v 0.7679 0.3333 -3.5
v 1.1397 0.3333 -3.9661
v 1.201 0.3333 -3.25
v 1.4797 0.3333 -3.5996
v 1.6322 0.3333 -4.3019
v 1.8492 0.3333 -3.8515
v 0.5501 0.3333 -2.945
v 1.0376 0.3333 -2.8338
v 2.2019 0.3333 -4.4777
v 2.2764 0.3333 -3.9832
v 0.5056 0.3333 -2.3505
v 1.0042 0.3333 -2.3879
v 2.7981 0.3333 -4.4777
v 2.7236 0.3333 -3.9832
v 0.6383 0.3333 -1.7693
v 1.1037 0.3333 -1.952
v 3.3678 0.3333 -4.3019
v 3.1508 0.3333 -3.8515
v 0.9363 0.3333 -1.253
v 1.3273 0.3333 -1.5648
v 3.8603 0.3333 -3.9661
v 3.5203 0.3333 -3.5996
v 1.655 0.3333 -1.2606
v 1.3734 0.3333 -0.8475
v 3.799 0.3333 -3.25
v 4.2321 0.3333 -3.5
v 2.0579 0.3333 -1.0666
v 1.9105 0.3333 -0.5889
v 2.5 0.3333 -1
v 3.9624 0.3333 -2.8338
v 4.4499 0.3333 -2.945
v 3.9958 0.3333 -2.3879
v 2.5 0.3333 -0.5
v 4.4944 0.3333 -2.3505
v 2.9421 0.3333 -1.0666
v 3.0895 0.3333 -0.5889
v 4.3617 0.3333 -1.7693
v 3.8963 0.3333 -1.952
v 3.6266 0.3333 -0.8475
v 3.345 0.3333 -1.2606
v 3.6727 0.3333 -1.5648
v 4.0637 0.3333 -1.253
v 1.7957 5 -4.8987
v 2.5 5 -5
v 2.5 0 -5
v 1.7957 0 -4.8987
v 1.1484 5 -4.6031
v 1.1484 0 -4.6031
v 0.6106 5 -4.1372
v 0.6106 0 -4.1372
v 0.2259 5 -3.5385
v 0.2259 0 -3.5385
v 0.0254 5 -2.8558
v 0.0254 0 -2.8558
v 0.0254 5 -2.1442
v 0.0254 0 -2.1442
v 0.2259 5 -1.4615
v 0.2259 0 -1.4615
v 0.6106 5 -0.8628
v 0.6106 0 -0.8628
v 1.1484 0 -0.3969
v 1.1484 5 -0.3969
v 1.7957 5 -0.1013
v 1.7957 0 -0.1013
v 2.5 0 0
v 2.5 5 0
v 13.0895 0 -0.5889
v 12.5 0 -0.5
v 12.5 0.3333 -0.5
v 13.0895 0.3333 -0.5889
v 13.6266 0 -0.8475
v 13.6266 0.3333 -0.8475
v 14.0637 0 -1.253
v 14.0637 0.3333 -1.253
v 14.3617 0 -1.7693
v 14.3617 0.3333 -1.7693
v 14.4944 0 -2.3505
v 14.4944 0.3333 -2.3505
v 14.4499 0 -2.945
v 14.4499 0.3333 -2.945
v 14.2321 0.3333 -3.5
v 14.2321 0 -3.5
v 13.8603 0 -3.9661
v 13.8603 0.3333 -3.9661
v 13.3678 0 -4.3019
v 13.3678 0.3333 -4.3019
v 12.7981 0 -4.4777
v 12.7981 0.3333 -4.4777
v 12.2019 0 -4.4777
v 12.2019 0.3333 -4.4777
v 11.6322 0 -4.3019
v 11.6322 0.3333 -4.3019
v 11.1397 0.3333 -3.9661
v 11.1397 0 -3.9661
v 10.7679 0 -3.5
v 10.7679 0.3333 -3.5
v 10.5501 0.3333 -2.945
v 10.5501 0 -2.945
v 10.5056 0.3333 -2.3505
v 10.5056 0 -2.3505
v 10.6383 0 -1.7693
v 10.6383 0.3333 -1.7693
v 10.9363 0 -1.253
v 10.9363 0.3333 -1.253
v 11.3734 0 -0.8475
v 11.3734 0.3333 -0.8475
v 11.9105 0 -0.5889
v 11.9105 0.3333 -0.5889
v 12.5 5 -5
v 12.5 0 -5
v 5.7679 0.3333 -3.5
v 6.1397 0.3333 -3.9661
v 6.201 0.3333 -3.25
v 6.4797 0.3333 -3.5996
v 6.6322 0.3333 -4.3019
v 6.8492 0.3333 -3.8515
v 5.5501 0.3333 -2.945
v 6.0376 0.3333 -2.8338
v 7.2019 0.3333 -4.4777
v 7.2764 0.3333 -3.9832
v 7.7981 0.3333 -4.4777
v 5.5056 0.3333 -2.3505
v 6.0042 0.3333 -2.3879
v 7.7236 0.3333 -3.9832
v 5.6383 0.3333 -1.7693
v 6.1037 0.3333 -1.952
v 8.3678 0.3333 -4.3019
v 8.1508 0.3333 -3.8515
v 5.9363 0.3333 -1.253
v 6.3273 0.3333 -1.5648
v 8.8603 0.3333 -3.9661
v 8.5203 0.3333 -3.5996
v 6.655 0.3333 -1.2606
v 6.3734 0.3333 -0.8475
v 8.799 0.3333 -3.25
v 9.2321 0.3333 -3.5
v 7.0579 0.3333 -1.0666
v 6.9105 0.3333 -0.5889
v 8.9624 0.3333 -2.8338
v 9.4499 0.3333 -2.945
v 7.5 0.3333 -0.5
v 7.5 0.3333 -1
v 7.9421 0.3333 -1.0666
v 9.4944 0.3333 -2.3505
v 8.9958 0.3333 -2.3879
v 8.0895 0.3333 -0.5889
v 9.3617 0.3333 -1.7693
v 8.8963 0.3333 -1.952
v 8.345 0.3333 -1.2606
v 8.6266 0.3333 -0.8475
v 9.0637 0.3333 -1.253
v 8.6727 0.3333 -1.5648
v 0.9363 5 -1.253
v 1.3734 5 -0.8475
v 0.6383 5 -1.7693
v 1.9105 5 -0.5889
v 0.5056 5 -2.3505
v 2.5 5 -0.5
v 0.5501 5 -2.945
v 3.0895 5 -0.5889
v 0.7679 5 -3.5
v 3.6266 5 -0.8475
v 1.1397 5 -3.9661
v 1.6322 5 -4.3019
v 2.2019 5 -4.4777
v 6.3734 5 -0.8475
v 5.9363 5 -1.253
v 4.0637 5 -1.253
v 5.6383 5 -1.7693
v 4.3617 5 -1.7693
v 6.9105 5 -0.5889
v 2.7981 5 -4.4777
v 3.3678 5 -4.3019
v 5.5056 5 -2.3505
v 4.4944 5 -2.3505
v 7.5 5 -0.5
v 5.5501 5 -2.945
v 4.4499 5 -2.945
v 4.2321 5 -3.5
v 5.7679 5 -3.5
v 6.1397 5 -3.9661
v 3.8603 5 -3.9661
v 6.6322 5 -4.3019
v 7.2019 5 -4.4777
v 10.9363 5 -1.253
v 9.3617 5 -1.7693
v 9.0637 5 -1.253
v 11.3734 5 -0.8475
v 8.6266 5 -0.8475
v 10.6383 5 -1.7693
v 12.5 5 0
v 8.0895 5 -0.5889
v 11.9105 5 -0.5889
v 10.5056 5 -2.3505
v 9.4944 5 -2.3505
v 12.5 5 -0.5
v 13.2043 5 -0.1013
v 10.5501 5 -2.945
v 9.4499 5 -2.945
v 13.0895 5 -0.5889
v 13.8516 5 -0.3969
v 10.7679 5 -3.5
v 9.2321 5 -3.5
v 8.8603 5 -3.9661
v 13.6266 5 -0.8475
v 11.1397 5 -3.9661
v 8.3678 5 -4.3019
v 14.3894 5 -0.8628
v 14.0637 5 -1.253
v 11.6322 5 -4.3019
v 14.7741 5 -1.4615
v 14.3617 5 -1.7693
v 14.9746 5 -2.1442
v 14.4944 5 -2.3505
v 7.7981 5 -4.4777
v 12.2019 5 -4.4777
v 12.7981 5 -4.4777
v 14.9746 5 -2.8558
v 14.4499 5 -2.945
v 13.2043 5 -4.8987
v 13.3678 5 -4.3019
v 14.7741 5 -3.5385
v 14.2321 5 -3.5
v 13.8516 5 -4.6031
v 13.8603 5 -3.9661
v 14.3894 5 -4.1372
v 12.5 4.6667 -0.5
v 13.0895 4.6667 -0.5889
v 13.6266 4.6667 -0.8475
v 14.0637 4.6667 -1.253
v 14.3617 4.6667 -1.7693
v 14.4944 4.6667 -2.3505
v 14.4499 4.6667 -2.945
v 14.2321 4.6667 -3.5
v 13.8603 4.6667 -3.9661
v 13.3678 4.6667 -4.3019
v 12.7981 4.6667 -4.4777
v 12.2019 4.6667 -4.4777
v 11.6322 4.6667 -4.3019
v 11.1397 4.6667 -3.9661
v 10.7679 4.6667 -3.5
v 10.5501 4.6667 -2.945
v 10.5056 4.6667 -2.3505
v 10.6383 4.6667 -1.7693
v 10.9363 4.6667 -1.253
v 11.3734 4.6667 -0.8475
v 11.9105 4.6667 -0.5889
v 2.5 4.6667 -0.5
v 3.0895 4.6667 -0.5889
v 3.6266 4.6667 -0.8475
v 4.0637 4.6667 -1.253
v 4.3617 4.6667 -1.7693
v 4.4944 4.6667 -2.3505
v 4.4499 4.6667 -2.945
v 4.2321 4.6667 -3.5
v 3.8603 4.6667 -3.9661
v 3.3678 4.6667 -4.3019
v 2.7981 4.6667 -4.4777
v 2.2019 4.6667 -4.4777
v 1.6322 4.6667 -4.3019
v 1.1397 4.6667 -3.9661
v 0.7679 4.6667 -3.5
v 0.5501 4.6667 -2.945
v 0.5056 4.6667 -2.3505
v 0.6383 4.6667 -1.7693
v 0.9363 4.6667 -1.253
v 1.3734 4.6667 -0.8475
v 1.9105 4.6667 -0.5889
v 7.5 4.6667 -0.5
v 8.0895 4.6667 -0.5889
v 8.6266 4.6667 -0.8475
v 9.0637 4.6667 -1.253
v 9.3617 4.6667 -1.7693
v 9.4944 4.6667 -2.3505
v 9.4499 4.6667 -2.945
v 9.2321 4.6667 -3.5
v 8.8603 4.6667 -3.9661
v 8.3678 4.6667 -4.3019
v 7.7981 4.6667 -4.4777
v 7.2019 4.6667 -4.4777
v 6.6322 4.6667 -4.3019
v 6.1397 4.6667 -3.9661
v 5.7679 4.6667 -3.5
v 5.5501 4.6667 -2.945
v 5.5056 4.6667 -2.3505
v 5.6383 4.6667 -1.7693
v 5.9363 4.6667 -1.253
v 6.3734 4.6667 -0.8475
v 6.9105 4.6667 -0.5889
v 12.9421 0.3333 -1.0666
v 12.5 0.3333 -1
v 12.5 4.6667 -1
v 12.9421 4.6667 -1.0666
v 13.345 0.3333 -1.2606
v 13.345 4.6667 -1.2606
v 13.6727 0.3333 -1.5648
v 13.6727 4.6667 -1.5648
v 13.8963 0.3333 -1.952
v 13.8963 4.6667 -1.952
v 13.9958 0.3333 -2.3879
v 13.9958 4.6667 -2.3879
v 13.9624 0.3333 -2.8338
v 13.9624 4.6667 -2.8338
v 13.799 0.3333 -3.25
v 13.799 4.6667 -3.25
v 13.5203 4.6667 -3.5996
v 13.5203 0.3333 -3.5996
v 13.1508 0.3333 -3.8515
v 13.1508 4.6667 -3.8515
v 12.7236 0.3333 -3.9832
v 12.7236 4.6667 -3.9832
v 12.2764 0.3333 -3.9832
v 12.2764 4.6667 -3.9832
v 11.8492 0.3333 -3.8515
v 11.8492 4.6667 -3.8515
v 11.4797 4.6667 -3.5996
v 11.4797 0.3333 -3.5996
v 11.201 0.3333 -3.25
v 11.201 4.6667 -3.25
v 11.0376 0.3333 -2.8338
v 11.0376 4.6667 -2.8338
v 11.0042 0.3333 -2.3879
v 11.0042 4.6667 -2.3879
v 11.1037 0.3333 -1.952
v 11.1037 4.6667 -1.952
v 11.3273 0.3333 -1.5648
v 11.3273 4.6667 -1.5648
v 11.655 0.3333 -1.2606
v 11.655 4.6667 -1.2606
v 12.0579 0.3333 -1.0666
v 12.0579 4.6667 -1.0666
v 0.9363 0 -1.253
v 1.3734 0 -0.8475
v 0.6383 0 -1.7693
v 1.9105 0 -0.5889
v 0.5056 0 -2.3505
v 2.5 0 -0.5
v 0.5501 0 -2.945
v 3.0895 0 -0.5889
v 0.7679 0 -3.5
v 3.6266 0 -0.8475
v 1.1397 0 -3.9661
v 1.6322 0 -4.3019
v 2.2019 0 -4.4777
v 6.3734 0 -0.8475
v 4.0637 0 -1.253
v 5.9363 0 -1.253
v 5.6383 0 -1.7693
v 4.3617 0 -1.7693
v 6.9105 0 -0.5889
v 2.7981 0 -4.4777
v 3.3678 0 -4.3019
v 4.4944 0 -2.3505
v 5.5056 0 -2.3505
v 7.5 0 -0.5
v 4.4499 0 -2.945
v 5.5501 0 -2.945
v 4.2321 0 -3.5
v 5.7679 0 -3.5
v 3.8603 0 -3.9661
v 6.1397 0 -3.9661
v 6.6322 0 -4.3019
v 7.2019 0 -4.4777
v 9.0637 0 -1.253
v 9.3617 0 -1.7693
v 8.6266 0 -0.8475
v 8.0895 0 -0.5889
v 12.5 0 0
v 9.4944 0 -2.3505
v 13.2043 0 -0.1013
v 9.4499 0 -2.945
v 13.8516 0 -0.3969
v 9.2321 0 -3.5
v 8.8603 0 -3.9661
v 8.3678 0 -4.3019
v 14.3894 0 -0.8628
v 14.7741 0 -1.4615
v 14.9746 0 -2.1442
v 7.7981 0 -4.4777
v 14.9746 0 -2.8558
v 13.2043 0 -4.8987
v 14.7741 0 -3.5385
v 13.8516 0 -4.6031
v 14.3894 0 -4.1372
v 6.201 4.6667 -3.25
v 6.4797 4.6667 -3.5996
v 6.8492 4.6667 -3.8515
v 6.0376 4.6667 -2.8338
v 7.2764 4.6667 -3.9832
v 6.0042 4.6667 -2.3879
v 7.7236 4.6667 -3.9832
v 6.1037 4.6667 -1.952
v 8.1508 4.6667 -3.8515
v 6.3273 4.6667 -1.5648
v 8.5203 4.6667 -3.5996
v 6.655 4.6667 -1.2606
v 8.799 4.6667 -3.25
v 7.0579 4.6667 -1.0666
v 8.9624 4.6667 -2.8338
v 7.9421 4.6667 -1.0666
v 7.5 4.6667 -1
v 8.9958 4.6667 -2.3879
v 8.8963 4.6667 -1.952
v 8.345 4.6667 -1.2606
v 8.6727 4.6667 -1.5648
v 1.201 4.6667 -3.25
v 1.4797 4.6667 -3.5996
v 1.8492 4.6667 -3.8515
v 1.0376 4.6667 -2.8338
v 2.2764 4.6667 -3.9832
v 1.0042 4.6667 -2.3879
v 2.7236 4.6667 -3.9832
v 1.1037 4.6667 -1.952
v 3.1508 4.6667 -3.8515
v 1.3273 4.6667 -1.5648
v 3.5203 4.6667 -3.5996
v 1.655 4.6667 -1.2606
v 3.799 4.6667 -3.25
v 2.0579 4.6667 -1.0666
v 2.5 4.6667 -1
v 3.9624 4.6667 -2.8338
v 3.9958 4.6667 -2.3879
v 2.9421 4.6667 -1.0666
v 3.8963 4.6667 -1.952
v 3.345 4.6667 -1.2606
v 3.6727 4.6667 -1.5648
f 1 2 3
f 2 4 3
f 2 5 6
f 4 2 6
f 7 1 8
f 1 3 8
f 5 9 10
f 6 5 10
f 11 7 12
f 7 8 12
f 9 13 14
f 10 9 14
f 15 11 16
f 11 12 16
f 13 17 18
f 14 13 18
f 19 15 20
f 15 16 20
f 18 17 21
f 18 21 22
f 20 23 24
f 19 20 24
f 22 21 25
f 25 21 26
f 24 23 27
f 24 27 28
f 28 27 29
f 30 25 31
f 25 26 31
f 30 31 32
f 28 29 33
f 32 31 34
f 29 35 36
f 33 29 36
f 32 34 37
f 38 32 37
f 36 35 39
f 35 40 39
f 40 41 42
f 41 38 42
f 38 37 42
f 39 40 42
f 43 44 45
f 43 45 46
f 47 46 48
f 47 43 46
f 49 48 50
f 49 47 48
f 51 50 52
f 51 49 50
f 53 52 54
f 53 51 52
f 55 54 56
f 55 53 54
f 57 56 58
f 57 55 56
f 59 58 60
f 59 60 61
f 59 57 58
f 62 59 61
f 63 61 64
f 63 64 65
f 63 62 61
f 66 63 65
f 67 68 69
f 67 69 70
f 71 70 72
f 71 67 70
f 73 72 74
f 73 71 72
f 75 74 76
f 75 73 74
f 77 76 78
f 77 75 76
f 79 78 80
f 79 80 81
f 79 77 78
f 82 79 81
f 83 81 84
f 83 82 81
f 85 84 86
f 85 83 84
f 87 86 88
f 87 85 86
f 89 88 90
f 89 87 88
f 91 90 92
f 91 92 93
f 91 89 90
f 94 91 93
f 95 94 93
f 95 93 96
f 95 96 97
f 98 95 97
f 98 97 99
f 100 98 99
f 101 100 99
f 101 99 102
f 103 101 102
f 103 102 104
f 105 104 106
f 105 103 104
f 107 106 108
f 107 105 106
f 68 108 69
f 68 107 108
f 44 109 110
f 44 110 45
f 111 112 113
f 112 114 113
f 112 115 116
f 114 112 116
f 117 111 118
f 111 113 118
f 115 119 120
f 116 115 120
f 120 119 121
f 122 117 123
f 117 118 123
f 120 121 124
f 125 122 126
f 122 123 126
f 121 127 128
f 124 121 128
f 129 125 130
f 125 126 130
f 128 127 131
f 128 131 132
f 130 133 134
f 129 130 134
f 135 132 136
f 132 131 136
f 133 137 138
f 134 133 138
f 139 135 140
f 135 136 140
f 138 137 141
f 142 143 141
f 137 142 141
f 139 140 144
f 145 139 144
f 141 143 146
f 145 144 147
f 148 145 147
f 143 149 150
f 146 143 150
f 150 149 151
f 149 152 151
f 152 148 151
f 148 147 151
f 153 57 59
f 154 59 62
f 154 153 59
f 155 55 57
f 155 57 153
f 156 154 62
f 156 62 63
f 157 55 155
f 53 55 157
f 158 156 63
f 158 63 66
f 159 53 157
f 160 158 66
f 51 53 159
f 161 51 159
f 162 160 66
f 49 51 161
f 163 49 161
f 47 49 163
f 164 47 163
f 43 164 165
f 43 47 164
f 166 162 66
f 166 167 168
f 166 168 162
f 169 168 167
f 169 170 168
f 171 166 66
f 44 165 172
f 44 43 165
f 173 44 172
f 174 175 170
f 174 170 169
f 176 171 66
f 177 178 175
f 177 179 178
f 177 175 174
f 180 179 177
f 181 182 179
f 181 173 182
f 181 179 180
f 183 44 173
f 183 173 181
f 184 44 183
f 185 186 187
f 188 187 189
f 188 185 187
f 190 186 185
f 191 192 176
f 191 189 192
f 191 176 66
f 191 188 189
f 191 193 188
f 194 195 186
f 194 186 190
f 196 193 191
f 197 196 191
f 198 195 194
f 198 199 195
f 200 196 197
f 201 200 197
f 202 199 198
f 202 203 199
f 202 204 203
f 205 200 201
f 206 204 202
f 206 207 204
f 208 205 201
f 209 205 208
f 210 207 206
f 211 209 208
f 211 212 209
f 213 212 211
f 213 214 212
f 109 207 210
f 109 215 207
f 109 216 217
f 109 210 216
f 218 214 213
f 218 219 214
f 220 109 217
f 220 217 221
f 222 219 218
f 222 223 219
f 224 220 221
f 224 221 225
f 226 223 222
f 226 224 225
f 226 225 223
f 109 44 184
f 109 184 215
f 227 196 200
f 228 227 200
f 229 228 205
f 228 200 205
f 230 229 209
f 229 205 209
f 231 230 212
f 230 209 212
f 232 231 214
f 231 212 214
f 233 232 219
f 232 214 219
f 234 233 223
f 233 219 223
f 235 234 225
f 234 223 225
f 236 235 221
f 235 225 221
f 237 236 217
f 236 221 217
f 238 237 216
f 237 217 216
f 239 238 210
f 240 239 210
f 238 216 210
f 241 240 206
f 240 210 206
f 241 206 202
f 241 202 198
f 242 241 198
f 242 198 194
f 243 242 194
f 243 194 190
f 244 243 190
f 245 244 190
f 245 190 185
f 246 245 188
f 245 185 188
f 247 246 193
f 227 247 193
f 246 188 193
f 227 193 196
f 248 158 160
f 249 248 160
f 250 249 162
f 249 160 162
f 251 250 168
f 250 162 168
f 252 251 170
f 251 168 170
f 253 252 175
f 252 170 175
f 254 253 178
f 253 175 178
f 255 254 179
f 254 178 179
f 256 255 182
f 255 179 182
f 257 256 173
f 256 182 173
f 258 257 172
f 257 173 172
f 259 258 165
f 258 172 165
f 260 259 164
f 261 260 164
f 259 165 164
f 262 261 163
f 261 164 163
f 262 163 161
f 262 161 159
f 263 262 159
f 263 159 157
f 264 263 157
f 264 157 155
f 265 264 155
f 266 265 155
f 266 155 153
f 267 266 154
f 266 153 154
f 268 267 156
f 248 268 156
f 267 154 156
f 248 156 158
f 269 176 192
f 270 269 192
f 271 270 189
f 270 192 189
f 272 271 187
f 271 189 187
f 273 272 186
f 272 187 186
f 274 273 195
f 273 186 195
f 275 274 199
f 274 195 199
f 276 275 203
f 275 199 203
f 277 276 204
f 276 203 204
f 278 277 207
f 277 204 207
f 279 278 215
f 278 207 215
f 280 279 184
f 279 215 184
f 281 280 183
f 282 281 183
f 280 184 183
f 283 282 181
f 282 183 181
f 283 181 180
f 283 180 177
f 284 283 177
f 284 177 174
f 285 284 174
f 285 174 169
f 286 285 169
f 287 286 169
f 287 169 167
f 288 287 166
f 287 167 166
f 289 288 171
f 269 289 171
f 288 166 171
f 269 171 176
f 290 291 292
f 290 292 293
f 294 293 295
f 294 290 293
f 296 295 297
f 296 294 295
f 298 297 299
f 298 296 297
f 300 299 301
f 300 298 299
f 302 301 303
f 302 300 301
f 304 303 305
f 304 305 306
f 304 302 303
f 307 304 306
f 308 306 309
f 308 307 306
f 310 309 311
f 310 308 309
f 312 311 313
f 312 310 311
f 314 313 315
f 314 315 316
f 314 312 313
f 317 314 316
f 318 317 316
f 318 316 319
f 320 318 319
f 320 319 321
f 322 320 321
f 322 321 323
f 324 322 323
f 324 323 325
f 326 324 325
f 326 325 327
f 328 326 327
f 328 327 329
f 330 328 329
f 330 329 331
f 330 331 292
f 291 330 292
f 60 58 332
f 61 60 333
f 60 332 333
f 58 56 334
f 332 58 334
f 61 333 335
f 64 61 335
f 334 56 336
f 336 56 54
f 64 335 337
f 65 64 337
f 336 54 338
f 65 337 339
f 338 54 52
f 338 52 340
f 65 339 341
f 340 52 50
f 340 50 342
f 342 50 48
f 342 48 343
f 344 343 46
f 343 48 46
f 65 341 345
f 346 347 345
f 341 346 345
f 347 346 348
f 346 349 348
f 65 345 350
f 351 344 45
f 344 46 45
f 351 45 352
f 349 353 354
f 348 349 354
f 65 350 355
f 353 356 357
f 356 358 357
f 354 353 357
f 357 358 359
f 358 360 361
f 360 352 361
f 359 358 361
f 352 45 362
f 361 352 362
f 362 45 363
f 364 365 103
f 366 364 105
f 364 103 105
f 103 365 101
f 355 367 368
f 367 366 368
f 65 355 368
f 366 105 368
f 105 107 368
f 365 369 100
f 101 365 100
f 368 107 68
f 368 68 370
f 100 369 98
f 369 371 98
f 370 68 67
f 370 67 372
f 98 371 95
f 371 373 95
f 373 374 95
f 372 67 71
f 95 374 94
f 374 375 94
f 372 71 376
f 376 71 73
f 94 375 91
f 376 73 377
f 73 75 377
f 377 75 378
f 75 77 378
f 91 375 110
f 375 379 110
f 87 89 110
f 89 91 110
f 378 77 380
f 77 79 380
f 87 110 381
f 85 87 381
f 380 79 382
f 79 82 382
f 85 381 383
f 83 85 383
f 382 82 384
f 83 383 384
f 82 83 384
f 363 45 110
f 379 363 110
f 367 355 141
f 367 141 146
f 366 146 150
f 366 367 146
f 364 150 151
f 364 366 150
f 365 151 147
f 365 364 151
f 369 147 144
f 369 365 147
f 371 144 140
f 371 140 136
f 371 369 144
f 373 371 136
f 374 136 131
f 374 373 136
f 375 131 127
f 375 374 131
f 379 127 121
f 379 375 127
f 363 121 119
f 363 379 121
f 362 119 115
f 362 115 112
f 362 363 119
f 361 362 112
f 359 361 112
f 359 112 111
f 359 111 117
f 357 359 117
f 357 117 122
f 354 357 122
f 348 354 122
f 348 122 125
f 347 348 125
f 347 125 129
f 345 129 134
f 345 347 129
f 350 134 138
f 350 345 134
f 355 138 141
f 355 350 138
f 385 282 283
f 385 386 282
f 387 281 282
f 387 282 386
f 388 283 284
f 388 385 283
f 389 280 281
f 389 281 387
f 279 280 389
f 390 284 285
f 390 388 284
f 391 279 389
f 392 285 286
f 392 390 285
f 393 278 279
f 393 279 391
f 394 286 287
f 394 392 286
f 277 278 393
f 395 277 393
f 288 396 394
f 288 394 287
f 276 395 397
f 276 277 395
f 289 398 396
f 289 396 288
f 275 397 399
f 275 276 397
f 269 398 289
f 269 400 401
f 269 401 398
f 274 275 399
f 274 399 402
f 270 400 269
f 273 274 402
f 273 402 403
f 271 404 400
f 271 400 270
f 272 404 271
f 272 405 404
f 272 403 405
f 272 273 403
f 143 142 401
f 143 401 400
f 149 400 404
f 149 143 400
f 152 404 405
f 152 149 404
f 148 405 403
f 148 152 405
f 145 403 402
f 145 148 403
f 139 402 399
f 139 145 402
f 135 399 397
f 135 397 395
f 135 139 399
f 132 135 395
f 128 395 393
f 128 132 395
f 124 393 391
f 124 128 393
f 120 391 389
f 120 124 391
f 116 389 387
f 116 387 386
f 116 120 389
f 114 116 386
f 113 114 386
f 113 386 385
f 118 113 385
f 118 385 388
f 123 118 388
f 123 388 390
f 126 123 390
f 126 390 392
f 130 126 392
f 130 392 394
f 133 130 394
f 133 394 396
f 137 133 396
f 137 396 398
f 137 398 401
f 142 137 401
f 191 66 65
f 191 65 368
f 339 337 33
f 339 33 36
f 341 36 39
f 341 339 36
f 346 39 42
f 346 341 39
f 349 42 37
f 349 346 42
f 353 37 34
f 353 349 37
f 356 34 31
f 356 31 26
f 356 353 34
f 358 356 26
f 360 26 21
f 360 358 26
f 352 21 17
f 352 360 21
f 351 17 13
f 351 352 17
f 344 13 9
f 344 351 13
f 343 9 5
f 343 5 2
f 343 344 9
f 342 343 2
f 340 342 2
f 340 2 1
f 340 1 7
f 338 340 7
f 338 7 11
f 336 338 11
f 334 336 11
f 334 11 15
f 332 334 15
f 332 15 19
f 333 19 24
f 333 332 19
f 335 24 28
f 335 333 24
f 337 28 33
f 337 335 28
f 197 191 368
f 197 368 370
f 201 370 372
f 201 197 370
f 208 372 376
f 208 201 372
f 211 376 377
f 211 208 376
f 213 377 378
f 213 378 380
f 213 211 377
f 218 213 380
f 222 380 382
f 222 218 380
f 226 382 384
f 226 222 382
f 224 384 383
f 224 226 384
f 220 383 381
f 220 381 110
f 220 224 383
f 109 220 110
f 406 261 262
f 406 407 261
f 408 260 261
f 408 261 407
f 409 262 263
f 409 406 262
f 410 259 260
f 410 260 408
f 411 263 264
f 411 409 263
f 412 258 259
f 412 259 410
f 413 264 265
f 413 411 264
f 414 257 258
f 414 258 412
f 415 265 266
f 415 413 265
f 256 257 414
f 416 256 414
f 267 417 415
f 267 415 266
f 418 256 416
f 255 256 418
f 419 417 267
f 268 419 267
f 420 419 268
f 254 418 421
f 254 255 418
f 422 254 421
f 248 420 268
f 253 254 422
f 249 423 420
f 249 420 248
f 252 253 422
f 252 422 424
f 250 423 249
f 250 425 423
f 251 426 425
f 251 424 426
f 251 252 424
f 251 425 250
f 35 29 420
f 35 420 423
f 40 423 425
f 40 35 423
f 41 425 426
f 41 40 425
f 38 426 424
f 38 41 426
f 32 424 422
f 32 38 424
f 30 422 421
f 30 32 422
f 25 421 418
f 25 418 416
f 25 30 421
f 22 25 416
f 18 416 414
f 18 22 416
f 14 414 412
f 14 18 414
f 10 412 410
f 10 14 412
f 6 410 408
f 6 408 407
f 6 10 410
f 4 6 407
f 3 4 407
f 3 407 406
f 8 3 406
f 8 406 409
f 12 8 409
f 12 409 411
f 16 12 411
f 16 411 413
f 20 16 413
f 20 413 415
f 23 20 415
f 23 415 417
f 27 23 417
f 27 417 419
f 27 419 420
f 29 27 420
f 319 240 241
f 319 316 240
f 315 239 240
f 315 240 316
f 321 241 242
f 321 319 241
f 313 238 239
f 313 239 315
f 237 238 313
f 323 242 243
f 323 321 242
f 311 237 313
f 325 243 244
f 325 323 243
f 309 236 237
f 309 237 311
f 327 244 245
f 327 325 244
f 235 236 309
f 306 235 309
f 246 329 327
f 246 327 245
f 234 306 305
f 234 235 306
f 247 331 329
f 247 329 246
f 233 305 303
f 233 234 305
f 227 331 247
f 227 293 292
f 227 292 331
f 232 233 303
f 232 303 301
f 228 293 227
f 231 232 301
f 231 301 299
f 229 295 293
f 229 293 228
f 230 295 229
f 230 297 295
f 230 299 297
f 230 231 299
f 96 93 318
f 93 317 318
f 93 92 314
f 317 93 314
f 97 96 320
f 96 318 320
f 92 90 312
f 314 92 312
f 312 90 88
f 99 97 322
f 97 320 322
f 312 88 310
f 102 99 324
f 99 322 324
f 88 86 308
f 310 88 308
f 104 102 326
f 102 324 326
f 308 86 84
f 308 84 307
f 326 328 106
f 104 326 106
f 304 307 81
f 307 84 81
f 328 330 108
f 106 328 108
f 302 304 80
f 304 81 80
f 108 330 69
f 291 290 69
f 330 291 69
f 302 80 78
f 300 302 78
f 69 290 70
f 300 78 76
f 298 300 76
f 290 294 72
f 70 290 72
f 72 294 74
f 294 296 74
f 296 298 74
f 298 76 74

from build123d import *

# Parameters (mm, degrees)
SKETCH1_R           = 1.5
BOSS_EXTRUDE3_DEPTH = 2.5
SKETCH1_5_R         = 2
SKETCH1_5_R_2       = 1.5
CUT_EXTRUDE1_DEPTH  = 0.333333333


with BuildPart() as part:
    # Sketch1 → Boss-Extrude3 (new body)
    with BuildSketch(Plane(origin=(0, 0, 0), x_dir=(1, 0, 0), z_dir=(0, 1, 0))):
        with BuildLine():
            Line((12.5, 5), (2.5, 5))
            ThreePointArc((2.5, 5), (0, 2.5), (2.5, 0))
            Line((2.5, 0), (12.5, 0))
            ThreePointArc((12.5, 0), (15, 2.5), (12.5, 5))
        make_face()
        with Locations((7.5, 2.5)):
            Circle(SKETCH1_R, mode=Mode.SUBTRACT)
        with Locations((2.5, 2.5)):
            Circle(SKETCH1_R, mode=Mode.SUBTRACT)
        with Locations((12.5, 2.5)):
            Circle(SKETCH1_R, mode=Mode.SUBTRACT)
    boss_extrude3 = extrude(amount=BOSS_EXTRUDE3_DEPTH)

    # Sketch1<5> → Cut-Extrude1 (cut)
    # profile 1 of 3: a face of its own
    with BuildSketch(Plane(origin=(0, 0, 0), x_dir=(1, 0, 0), z_dir=(0, 1, 0))):
        with Locations((2.5, 2.5)):
            Circle(SKETCH1_5_R)
        with Locations((2.5, 2.5)):
            Circle(SKETCH1_5_R_2, mode=Mode.SUBTRACT)
    # profile 2 of 3: a face of its own
    with BuildSketch(Plane(origin=(0, 0, 0), x_dir=(1, 0, 0), z_dir=(0, 1, 0))):
        with Locations((7.5, 2.5)):
            Circle(SKETCH1_5_R)
        with Locations((7.5, 2.5)):
            Circle(SKETCH1_5_R_2, mode=Mode.SUBTRACT)
    # profile 3 of 3: a face of its own
    with BuildSketch(Plane(origin=(0, 0, 0), x_dir=(1, 0, 0), z_dir=(0, 1, 0))):
        with Locations((12.5, 2.5)):
            Circle(SKETCH1_5_R)
        with Locations((12.5, 2.5)):
            Circle(SKETCH1_5_R_2, mode=Mode.SUBTRACT)
    cut_extrude1 = extrude(amount=CUT_EXTRUDE1_DEPTH, mode=Mode.SUBTRACT)

    # Mirror2: Boss-Extrude3, Cut-Extrude1 across plane
    add(boss_extrude3.mirror(Plane.ZX.offset(2.5)))
    add(cut_extrude1.mirror(Plane.ZX.offset(2.5)), mode=Mode.SUBTRACT)


solid = part.part
